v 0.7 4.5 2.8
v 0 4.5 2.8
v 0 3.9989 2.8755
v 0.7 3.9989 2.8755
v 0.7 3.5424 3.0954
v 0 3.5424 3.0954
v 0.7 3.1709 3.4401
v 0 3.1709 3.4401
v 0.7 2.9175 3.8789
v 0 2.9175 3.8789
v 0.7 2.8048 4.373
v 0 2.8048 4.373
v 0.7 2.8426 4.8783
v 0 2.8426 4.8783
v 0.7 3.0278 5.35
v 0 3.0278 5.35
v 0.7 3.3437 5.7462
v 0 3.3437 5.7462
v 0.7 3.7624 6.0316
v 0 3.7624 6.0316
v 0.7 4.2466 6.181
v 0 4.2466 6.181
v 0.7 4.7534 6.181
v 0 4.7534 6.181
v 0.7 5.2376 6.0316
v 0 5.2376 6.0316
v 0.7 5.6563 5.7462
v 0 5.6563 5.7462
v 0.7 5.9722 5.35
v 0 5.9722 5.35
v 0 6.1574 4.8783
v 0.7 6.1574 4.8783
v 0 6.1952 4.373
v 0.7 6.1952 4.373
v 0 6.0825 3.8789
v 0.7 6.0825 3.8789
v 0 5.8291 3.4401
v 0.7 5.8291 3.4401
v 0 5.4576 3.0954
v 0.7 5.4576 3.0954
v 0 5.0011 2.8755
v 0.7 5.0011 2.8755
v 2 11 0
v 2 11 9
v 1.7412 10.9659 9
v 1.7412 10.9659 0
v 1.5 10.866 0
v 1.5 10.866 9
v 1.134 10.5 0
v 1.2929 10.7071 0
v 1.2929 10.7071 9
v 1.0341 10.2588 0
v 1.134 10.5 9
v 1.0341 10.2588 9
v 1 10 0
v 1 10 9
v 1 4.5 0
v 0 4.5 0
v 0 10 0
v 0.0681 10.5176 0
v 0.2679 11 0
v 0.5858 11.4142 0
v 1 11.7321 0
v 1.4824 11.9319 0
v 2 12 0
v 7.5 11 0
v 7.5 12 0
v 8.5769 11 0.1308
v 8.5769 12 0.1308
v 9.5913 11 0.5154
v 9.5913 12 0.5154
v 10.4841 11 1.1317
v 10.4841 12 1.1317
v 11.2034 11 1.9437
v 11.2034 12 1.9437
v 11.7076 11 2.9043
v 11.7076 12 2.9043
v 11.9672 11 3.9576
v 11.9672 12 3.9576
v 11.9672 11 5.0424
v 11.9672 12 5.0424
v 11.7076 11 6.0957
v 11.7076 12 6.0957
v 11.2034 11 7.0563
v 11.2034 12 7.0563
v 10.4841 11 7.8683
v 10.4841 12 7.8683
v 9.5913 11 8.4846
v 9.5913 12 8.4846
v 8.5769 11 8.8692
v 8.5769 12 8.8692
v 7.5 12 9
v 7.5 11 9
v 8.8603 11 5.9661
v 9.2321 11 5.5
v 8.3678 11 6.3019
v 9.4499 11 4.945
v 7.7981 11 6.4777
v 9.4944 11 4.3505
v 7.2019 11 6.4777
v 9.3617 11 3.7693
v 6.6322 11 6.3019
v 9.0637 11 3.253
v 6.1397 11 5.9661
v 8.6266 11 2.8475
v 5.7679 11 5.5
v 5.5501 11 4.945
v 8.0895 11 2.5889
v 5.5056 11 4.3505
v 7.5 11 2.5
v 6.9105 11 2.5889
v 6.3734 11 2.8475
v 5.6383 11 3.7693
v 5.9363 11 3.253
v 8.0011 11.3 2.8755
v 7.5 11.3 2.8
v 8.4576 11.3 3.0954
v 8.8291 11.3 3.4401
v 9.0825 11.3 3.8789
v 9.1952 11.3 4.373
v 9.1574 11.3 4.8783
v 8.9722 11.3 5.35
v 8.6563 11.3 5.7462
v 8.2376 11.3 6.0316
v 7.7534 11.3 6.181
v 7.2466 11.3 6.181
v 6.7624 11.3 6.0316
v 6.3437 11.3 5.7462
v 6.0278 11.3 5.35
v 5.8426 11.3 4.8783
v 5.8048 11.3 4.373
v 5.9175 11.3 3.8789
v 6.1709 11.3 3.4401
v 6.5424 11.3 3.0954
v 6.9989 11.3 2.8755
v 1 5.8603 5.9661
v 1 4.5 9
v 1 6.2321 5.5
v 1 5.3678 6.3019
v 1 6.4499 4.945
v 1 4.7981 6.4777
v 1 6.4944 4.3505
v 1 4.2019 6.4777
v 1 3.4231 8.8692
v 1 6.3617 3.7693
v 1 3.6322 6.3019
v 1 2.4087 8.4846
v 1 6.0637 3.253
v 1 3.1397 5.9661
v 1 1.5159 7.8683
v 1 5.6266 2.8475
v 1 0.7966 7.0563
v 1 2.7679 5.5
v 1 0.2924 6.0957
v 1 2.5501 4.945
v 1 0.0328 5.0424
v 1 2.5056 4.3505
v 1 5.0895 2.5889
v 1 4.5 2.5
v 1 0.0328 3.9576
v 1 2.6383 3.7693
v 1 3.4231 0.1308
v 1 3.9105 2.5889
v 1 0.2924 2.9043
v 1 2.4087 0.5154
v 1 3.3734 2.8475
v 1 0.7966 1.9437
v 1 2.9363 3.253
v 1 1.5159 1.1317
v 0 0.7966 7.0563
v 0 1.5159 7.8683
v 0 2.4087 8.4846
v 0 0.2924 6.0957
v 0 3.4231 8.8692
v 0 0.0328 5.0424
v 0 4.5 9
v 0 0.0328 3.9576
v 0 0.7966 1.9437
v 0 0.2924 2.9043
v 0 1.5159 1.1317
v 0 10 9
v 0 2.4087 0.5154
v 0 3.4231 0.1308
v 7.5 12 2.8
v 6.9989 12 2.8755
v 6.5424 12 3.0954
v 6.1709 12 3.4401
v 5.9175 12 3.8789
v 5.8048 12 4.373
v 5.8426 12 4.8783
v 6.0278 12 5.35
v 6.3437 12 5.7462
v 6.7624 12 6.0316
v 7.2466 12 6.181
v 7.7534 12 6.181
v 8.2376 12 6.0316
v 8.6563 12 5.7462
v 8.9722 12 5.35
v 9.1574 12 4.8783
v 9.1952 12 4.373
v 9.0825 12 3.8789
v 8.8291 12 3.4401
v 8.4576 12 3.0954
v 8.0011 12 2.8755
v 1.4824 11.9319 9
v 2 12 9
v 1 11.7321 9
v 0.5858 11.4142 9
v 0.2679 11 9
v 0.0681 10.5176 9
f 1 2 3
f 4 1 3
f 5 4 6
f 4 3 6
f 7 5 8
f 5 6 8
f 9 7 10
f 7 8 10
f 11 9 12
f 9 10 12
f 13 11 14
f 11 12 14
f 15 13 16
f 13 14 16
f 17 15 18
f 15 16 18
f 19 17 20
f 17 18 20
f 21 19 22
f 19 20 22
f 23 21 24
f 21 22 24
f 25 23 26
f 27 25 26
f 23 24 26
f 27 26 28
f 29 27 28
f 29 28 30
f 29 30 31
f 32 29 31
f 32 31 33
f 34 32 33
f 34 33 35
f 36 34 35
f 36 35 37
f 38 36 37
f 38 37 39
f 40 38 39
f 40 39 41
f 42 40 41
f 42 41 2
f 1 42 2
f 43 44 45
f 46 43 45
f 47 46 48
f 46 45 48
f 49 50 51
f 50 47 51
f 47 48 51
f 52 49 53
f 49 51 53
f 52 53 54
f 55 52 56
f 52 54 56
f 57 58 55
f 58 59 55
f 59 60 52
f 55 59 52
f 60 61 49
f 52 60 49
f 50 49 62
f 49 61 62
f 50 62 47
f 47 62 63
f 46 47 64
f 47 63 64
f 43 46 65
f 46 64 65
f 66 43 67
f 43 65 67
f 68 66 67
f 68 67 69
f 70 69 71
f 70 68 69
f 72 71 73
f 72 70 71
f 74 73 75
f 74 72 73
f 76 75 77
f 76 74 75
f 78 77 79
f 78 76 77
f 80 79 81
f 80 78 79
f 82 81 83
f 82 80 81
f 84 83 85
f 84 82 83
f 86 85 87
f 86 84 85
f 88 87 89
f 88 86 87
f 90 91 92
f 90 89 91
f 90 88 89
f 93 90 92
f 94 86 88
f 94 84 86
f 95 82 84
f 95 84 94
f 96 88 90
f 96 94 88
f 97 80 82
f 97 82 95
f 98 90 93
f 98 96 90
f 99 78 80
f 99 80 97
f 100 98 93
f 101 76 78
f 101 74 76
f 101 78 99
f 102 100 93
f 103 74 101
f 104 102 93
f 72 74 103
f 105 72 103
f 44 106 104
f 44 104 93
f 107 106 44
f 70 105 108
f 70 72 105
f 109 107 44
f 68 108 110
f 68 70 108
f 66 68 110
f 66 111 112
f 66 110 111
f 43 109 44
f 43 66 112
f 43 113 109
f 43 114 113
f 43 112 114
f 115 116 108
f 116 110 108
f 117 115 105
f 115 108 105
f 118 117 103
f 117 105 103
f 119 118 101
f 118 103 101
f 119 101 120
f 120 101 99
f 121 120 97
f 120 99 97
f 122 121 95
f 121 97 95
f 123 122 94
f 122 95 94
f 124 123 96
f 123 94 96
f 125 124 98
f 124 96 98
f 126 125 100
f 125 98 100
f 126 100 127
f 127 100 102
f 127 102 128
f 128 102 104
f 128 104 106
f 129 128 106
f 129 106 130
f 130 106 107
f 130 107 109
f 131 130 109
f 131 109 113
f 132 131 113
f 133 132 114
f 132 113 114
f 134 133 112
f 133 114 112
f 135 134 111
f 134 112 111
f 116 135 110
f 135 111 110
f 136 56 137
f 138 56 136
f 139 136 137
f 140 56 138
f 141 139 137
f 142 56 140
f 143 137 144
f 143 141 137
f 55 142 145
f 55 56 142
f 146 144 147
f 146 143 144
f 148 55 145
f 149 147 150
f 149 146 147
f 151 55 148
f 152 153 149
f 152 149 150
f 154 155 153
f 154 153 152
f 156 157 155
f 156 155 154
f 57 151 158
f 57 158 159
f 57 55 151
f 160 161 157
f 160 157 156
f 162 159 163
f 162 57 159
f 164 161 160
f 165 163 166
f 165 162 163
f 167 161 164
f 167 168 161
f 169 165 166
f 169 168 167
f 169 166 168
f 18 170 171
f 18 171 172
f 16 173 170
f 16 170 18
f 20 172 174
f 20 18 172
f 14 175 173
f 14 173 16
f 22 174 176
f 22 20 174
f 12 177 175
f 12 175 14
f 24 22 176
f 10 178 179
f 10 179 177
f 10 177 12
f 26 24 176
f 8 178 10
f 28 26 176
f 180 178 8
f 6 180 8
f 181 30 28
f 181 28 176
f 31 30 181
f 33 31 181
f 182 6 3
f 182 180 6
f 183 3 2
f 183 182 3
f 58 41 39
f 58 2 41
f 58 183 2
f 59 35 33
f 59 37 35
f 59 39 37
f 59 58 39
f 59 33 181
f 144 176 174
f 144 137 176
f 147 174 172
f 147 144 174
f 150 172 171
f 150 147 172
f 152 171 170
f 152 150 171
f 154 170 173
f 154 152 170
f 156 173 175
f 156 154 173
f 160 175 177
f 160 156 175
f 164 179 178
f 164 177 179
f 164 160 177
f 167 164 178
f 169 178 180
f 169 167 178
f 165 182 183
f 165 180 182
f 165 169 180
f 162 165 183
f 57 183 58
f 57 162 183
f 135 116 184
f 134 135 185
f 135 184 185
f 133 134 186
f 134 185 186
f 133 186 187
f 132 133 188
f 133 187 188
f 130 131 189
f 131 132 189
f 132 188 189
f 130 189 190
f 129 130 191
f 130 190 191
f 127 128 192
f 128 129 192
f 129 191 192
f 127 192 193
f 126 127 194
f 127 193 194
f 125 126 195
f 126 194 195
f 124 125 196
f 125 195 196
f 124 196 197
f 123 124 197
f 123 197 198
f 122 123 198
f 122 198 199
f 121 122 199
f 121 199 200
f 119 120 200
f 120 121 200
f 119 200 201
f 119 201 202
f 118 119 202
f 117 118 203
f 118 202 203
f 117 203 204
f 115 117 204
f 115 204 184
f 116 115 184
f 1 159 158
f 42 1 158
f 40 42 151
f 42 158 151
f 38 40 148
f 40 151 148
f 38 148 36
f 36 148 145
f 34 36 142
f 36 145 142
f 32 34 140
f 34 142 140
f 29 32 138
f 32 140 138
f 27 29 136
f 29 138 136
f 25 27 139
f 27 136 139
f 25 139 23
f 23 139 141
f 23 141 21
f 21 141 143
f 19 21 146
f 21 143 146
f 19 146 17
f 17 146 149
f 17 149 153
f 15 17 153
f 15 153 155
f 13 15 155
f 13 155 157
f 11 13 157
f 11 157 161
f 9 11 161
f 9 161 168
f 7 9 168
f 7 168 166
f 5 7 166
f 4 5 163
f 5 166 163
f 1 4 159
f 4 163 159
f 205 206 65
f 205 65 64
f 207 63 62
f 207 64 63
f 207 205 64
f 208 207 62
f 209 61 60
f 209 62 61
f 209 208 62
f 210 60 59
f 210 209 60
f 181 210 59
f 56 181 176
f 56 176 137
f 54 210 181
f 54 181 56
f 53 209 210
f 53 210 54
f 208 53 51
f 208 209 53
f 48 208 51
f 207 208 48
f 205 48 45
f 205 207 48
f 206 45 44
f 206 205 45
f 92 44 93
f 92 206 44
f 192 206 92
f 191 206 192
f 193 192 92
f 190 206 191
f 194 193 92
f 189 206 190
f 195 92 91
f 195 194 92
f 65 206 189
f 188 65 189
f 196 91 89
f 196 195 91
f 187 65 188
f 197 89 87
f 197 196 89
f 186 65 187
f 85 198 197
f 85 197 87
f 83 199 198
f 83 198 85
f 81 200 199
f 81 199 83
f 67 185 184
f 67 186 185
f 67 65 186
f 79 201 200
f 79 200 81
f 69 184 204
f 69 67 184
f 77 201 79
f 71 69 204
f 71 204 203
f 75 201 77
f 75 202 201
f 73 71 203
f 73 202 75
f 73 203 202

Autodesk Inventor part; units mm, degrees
ref_plane "YZ Plane" through (0, 0, 0) normal (1, 0, 0) x (0, 1, 0)
ref_plane "XZ Plane" through (0, 0, 0) normal (0, 1, 0) x (-1, 0, 0)
sketch "Sketch1" plane through (0, 0, 0) normal (0, 0, 1) x (1, 0, 0)
  line L0 (0, 0) -> (0, 12)
  line L1 (0, 12) -> (12, 12)
  line L2 (12, 12) -> (12, 11)
  line L3 (12, 11) -> (1, 11)
  line L4 (1, 11) -> (1, 0)
  line L5 (1, 0) -> (0, 0)
  dimension "d0" = 12
  dimension "d1" = 12
  dimension "d2" = 1
extrude "Extrusion1" add sketch "Sketch1" along normal blind 9
sketch "Sketch2" plane through (0, 0, 0) normal (-1, 0, 0) x (0, 0, 1)
  line L0 (9, 12) -> (9, 0) projected
  line L1 (0, 12) -> (9, 12) projected
  point P0 (0, 0)
  point P1 (4.5, 6)
  point P2 (9, 6)
  point P3 (4.5, 12)
sketch "Sketch5" plane through (1, 0, 0) normal (1, 0, 0) x (0, 0, -1)
  line L0 (0, 0) -> (0, 11) projected
  line L1 (0, 11) -> (-9, 11) projected
  line L2 (-9, 0) -> (-9, 11) projected
  line L3 (0, 0) -> (-9, 0) projected
  circle A0 centre (-4.5, 4.5) radius 4.5
  point P0 (0, 4.5)
  point P1 (-4.5, 0)
  point P2 (-9, 4.5)
hole "Hole2" at (1, 4.5, 4.5) direction (-1, 0, 0) diameter 3.4 end through all countersink diameter 4 countersink angle 90 clearance for "Flat Head Machine Screw" size "M3" standard "Ansi Metric M Profile"
extrude "Extrusion3" cut sketch "Sketch5" against normal blind 16.002 contours L3 A0 L0 | L3 L2 A0
ref_plane "Work Plane1" through (1, 11, 0) normal (-0.7071, -0.7071, 0) x (0, 0, -1)
mirror "Mirror1" about plane through (1, 11, 0) normal (-0.7071, -0.7071, 0) of "Extrusion3", "Hole2"
fillet "Fillet1" radius 2 1 edges at (0, 12, 4.5)
fillet "Fillet2" radius 1 1 edges at (1, 11, 4.5)
equation "\"d1\" = d0"
properties part number "Angle Bracket"
